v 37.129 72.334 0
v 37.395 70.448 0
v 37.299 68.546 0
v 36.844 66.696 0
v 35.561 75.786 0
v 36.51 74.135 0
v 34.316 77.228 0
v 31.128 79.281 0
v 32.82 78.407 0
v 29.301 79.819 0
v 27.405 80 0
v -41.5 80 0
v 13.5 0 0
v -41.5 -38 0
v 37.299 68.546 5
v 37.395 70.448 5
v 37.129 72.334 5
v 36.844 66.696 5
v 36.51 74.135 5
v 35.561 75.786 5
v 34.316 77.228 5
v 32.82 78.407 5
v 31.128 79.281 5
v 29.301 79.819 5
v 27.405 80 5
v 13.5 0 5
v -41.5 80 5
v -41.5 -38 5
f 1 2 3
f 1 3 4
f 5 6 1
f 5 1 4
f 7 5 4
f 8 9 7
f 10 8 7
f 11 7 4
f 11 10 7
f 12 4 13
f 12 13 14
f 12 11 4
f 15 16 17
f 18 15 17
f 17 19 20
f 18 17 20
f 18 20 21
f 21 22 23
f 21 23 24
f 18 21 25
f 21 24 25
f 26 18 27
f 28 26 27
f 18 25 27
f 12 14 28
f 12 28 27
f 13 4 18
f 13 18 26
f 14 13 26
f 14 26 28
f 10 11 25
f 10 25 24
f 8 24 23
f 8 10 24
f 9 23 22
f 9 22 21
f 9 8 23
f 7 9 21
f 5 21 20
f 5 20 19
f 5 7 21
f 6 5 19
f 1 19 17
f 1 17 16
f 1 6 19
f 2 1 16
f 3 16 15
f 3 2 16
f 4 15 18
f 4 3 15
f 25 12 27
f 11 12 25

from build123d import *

# Parameters (mm, degrees)
BOSS_EXTRUDE1_DEPTH = 5


with BuildPart() as part:
    # Sketch1 → Boss-Extrude1 (new body)
    with BuildSketch(Plane.XY):
        with BuildLine():
            Line((-41.5, -38), (-41.5, 80))
            Line((-41.5, 80), (27.40518995, 80))
            ThreePointArc((27.40518995, 80), (35.56101739, 75.786404649), (36.843773513, 66.696495753))
            Line((36.843773513, 66.696495753), (13.5, 0))
            Line((13.5, 0), (-41.5, -38))
        make_face()
    extrude(amount=BOSS_EXTRUDE1_DEPTH)


solid = part.part
